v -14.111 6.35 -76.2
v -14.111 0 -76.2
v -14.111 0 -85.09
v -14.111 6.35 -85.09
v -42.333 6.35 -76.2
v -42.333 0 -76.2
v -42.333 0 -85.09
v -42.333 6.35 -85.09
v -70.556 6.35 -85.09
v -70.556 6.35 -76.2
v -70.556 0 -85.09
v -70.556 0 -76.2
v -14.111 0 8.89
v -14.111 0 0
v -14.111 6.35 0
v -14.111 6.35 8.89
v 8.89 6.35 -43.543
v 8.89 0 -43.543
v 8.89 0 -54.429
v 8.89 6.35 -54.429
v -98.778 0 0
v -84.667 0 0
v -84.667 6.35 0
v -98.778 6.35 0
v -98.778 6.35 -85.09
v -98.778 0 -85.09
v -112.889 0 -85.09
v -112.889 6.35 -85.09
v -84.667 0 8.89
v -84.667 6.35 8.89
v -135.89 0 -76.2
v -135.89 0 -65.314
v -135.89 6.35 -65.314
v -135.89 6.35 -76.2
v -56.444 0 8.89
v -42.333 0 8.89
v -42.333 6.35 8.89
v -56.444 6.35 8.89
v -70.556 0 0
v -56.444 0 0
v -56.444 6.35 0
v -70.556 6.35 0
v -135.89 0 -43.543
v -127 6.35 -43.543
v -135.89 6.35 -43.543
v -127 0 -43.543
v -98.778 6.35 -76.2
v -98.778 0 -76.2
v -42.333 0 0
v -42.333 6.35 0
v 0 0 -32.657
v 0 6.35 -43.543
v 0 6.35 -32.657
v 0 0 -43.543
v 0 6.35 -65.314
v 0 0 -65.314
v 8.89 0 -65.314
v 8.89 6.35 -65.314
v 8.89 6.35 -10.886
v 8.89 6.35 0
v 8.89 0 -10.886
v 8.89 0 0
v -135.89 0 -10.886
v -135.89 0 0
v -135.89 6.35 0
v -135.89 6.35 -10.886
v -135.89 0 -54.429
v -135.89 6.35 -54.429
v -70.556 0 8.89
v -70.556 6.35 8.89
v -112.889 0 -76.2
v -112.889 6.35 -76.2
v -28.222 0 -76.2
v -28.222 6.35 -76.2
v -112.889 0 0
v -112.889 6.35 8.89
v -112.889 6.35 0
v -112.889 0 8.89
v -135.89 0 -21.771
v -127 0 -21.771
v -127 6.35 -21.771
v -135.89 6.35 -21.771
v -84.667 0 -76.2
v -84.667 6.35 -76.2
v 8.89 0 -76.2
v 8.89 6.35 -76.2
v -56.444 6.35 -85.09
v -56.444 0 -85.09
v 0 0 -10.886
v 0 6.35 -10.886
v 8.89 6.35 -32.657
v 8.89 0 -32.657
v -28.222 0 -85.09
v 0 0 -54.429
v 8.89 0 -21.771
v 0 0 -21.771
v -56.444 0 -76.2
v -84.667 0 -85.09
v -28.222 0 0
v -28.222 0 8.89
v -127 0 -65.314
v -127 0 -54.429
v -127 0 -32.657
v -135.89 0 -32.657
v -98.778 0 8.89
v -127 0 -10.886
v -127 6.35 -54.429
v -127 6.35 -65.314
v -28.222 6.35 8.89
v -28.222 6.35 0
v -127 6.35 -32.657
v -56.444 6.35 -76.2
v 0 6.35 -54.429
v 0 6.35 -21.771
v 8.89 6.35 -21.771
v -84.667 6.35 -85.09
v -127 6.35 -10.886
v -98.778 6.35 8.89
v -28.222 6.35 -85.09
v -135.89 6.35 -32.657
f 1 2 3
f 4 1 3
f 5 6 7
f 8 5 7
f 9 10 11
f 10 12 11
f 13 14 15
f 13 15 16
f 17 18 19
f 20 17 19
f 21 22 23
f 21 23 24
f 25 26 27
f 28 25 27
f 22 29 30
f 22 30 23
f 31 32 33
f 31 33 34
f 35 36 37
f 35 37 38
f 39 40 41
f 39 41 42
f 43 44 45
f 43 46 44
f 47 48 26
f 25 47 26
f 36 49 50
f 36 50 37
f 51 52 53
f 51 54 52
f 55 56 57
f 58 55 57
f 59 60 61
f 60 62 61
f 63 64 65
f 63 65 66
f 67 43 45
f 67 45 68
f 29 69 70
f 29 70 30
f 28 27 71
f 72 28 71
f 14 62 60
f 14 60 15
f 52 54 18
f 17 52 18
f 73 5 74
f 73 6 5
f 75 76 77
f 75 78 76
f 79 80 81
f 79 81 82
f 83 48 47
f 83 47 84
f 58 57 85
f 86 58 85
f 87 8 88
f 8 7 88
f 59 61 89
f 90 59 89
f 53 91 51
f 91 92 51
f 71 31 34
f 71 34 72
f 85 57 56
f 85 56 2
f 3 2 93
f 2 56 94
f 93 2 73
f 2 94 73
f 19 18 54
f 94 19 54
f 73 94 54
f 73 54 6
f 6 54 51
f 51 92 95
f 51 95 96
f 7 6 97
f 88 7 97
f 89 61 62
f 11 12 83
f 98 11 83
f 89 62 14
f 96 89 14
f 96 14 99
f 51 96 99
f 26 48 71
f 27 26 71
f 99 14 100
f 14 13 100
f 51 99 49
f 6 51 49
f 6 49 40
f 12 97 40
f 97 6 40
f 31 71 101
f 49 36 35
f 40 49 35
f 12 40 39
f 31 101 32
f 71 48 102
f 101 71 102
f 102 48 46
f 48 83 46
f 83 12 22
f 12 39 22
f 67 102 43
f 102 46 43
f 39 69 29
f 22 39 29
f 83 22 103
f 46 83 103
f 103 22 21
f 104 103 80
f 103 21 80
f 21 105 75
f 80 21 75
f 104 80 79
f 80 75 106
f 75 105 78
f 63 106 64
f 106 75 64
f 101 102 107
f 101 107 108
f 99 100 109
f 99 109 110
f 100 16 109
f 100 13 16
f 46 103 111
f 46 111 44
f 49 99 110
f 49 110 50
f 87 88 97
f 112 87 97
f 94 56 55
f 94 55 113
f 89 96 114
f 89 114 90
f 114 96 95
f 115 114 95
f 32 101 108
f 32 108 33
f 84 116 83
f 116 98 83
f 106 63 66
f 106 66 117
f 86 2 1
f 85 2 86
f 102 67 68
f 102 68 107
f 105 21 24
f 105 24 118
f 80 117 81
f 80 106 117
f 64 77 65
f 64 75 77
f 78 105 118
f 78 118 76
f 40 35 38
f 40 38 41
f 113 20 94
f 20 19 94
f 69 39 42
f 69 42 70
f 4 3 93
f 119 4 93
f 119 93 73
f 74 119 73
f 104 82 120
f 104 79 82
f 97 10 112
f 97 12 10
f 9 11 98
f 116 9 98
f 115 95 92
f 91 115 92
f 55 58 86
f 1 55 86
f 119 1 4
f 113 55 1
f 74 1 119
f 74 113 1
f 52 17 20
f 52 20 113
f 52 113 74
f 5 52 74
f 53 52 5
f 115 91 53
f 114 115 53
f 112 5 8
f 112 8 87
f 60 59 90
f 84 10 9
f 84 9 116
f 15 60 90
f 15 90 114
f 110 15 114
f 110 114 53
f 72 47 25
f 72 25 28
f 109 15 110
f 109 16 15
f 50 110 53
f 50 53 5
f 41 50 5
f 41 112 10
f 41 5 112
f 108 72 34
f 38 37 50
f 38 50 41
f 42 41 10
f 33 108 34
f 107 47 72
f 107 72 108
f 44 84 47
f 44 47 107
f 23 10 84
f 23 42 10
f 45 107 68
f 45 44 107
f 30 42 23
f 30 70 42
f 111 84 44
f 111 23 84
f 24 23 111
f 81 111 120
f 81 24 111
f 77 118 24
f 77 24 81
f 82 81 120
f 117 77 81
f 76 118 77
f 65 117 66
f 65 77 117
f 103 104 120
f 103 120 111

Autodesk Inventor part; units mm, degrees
ref_plane "YZ Plane" through (0, 0, 0) normal (1, 0, 0) x (0, 1, 0)
ref_plane "XZ Plane" through (0, 0, 0) normal (0, 1, 0) x (-1, 0, 0)
ref_plane "XY Plane" through (0, 0, 0) normal (0, 0, 1) x (1, 0, 0)
sketch "Sketch1" plane through (0, 0, 0) normal (0, 1, 0) x (-1, 0, 0)
  line L0 (0, 0) -> (127, 0)
  line L1 (127, 0) -> (127, -76.2)
  line L2 (127, -76.2) -> (0, -76.2)
  line L3 (0, -76.2) -> (0, 0)
  dimension "BoxHeight" = 127
  dimension "d1" = 76.2
sketch "Sketch2" plane through (0, 0, 0) normal (0, 1, 0) x (-1, 0, 0)
  line L0 (0, 0) -> (-8.89, 0)
  line L1 (-8.89, 0) -> (-8.89, -10.8857)
  line L2 (-8.89, -10.8857) -> (0, -10.8857)
  line L3 (0, -10.8857) -> (0, 0)
  line L4 (0, -76.2) -> (0, 0) projected
  line L5 (0, 0) -> (127, 0) projected
  line L6 (0, -21.7714) -> (-8.89, -21.7714)
  line L7 (-8.89, -21.7714) -> (-8.89, -32.6571)
  line L8 (-8.89, -32.6571) -> (0, -32.6571)
  line L9 (0, -32.6571) -> (0, -21.7714)
  line L10 (0, -43.5429) -> (-8.89, -43.5429)
  line L11 (-8.89, -43.5429) -> (-8.89, -54.4286)
  line L12 (-8.89, -54.4286) -> (0, -54.4286)
  line L13 (0, -54.4286) -> (0, -43.5429)
  line L14 (63.5, 0) -> (63.5, -115.824) construction
  line L15 (127, -10.8857) -> (127, 0)
  line L16 (127, -76.2) -> (127, 0)
  line L17 (127, -32.6571) -> (127, -21.7714)
  line L18 (127, -54.4286) -> (127, -43.5429)
  line L19 (28.2222, -76.2) -> (14.1111, -76.2)
  line L20 (14.1111, -76.2) -> (14.1111, -85.09)
  line L21 (14.1111, -85.09) -> (28.2222, -85.09)
  line L22 (28.2222, -85.09) -> (28.2222, -76.2)
  line L23 (127, -76.2) -> (0, -76.2) projected
  line L24 (56.4444, -76.2) -> (42.3333, -76.2)
  line L25 (42.3333, -76.2) -> (42.3333, -85.09)
  line L26 (42.3333, -85.09) -> (56.4444, -85.09)
  line L27 (56.4444, -85.09) -> (56.4444, -76.2)
  line L28 (84.6667, -76.2) -> (70.5556, -76.2)
  line L29 (70.5556, -76.2) -> (70.5556, -85.09)
  line L30 (70.5556, -85.09) -> (84.6667, -85.09)
  line L31 (84.6667, -85.09) -> (84.6667, -76.2)
  line L32 (112.8889, -76.2) -> (98.7778, -76.2)
  line L33 (98.7778, -76.2) -> (98.7778, -85.09)
  line L34 (98.7778, -85.09) -> (112.8889, -85.09)
  line L35 (112.8889, -85.09) -> (112.8889, -76.2)
  line L36 (127, -38.1) -> (0, -38.1) construction
  line L37 (63.5, -76.2) -> (63.5, 39.624) construction
  line L38 (28.2222, 0) -> (14.1111, 0)
  line L39 (14.1111, 0) -> (14.1111, 8.89)
  line L40 (14.1111, 8.89) -> (28.2222, 8.89)
  line L41 (28.2222, 8.89) -> (28.2222, 0)
  line L42 (127, 0) -> (0, 0)
  line L43 (56.4444, 0) -> (42.3333, 0)
  line L44 (42.3333, 0) -> (42.3333, 8.89)
  line L45 (42.3333, 8.89) -> (56.4444, 8.89)
  line L46 (56.4444, 8.89) -> (56.4444, 0)
  line L47 (84.6667, 0) -> (70.5556, 0)
  line L48 (70.5556, 0) -> (70.5556, 8.89)
  line L49 (84.6667, 8.89) -> (84.6667, 0)
  line L50 (70.5556, 8.89) -> (84.6667, 8.89)
  line L51 (112.8889, 0) -> (98.7778, 0)
  line L52 (98.7778, 0) -> (98.7778, 8.89)
  line L53 (112.8889, 8.89) -> (112.8889, 0)
  line L54 (98.7778, 8.89) -> (112.8889, 8.89)
  line L55 (0, -65.3143) -> (-8.89, -65.3143)
  line L56 (-8.89, -65.3143) -> (-8.89, -76.2)
  line L57 (-8.89, -76.2) -> (0, -76.2)
  line L58 (0, -76.2) -> (0, -65.3143)
  line L59 (127, 0) -> (135.89, 0)
  line L60 (135.89, 0) -> (135.89, -10.8857)
  line L61 (135.89, -10.8857) -> (127, -10.8857)
  line L62 (127, -10.8857) -> (127, 0)
  line L63 (127, -76.2) -> (127, 0)
  line L64 (127, -21.7714) -> (135.89, -21.7714)
  line L65 (135.89, -21.7714) -> (135.89, -32.6571)
  line L66 (135.89, -32.6571) -> (127, -32.6571)
  line L67 (127, -32.6571) -> (127, -21.7714)
  line L68 (127, -43.5429) -> (135.89, -43.5429)
  line L69 (135.89, -43.5429) -> (135.89, -54.4286)
  line L70 (135.89, -54.4286) -> (127, -54.4286)
  line L71 (127, -54.4286) -> (127, -43.5429)
  line L72 (135.89, -65.3143) -> (135.89, -76.2)
  line L73 (127, -65.3143) -> (135.89, -65.3143)
  line L74 (135.89, -76.2) -> (127, -76.2)
  line L75 (127, -76.2) -> (127, -65.3143)
  dimension "d2" = 8.89
  dimension "d3" = 10.8857
  dimension "d5" = 8.89
  dimension "d6" = 10.8857
  dimension "d7" = 10.8857
  dimension "d8" = 8.89
  dimension "d9" = 10.8857
  dimension "d10" = 10.8857
  dimension "d11" = 14.1111
  dimension "d12" = 127
  dimension "d13" = 14.1111
  dimension "d14" = 8.89
  dimension "d15" = 8.89
  dimension "d16" = 14.1111
  dimension "d17" = 8.89
  dimension "d18" = 14.1111
  dimension "d22" = 8.89
  dimension "d23" = 14.1111
  dimension "d27" = 14.1111
  dimension "d28" = 14.1111
  dimension "d29" = 14.1111
  dimension "d34" = 76.2
  dimension "d35" = 8.89
  dimension "d36" = 10.8857
  dimension "d41" = 10.8857
extrude "Connections" add sketch "Sketch2" along normal blind 6.35 contours L3 L2 L1 L0 | L39 L40 L41 L5 | L4 L8 L7 L6 | L44 L45 L46 L5 | L4 L12 L11 L10 | L48 L50 L49 L5 | L4 L57 L56 L55 | L52 L54 L53 L5 | L19 L22 L21 L20 | L59 L60 L61 L15 | L23 L27 L26 L25 | L64 L65 L66 L16 | L23 L31 L30 L29 | L68 L69 L70 L16 | L23 L35 L34 L33 | L73 L72 L74 L16
extrude "Base Extrusion" add sketch "Sketch1" along normal blind 6.35
sketch "Sketch3" plane through (0, 6.35, 0) normal (0, 1, 0) x (1, 0, 0)
  line L0 (-6.6713, 46.5048) -> (-6.6713, 27.1528) construction
  line L1 (-6.6713, 27.1528) -> (-46.955, 27.1528) construction
  line L2 (-46.955, 27.1528) -> (-46.955, 46.5048) construction
  line L3 (-46.955, 46.5048) -> (-6.6713, 46.5048) construction
  point P0 (0, 0)
sketch "Sketch4" plane through (0, 0, 0) normal (0, -1, 0) x (1, 0, 0)
  line L0 (-84.6667, 8.89) -> (-70.5556, 8.89) projected
  line L1 (-84.6667, 0) -> (-84.6667, 8.89) projected
  line L2 (-84.6667, 0) -> (-98.7778, 0) projected
  line L3 (-98.7778, 0) -> (-98.7778, 8.89) projected
  line L4 (-98.7778, 8.89) -> (-112.8889, 8.89) projected
  line L5 (-112.8889, 8.89) -> (-112.8889, 0) projected
  line L6 (-135.89, 0) -> (-112.8889, 0) projected
  line L7 (-135.89, -10.8857) -> (-135.89, 0) projected
  line L8 (-127, -10.8857) -> (-135.89, -10.8857) projected
  line L9 (-127, -10.8857) -> (-127, -21.7714) projected
  line L10 (-135.89, -21.7714) -> (-127, -21.7714) projected
  line L11 (-135.89, -32.6571) -> (-135.89, -21.7714) projected
  line L12 (-127, -32.6571) -> (-135.89, -32.6571) projected
  line L13 (-127, -32.6571) -> (-127, -43.5429) projected
  line L14 (-135.89, -43.5429) -> (-127, -43.5429) projected
  line L15 (-135.89, -54.4286) -> (-135.89, -43.5429) projected
  line L16 (-127, -54.4286) -> (-135.89, -54.4286) projected
  line L17 (-127, -54.4286) -> (-127, -65.3143) projected
  line L18 (-127, -65.3143) -> (-135.89, -65.3143) projected
  line L19 (-135.89, -65.3143) -> (-135.89, -76.2) projected
  line L20 (-135.89, -76.2) -> (-112.8889, -76.2) projected
  line L21 (-112.8889, -76.2) -> (-112.8889, -85.09) projected
  line L22 (-112.8889, -85.09) -> (-98.7778, -85.09) projected
  line L23 (-98.7778, -85.09) -> (-98.7778, -76.2) projected
  line L24 (-98.7778, -76.2) -> (-84.6667, -76.2) projected
  line L25 (-84.6667, -76.2) -> (-84.6667, -85.09) projected
  line L26 (-84.6667, -85.09) -> (-70.5556, -85.09) projected
  line L27 (-70.5556, -85.09) -> (-70.5556, -76.2) projected
  line L28 (-70.5556, -76.2) -> (-56.4444, -76.2) projected
  line L29 (-56.4444, -85.09) -> (-56.4444, -76.2) projected
  line L30 (-42.3333, -85.09) -> (-56.4444, -85.09) projected
  line L31 (-42.3333, -76.2) -> (-42.3333, -85.09) projected
  line L32 (-42.3333, -76.2) -> (-28.2222, -76.2) projected
  line L33 (-28.2222, -85.09) -> (-28.2222, -76.2) projected
  line L34 (-14.1111, -85.09) -> (-28.2222, -85.09) projected
  line L35 (-14.1111, -76.2) -> (-14.1111, -85.09) projected
  line L36 (-14.1111, -76.2) -> (8.89, -76.2) projected
  line L37 (8.89, -76.2) -> (8.89, -65.3143) projected
  line L38 (8.89, -65.3143) -> (0, -65.3143) projected
  line L39 (0, -65.3143) -> (0, -54.4286) projected
  line L40 (8.89, -54.4286) -> (0, -54.4286) projected
  line L41 (8.89, -43.5429) -> (8.89, -54.4286) projected
  line L42 (0, -43.5429) -> (8.89, -43.5429) projected
  line L43 (0, -43.5429) -> (0, -32.6571) projected
  line L44 (8.89, -32.6571) -> (0, -32.6571) projected
  line L45 (8.89, -21.7714) -> (8.89, -32.6571) projected
  line L46 (0, -21.7714) -> (8.89, -21.7714) projected
  line L47 (0, -21.7714) -> (0, -10.8857) projected
  line L48 (8.89, -10.8857) -> (0, -10.8857) projected
  line L49 (8.89, 0) -> (8.89, -10.8857) projected
  line L50 (-14.1111, 0) -> (8.89, 0) projected
  line L51 (-14.1111, 0) -> (-14.1111, 8.89) projected
  line L52 (-14.1111, 8.89) -> (-28.2222, 8.89) projected
  line L53 (-28.2222, 8.89) -> (-28.2222, 0) projected
  line L54 (-28.2222, 0) -> (-42.3333, 0) projected
  line L55 (-42.3333, 8.89) -> (-42.3333, 0) projected
  line L56 (-56.4444, 8.89) -> (-42.3333, 8.89) projected
  line L57 (-56.4444, 0) -> (-56.4444, 8.89) projected
  line L58 (-56.4444, 0) -> (-70.5556, 0) projected
  line L59 (-70.5556, 8.89) -> (-70.5556, 0) projected
  point P0 (0, 0)
equation "\"d1\" = BaseLength"
equation "\"d2\" = PerpA"
equation "\"d3\" = PerpB"
equation "\"d5\" = d2"
equation "\"d6\" = d3"
equation "\"d7\" = PerpSpace"
equation "\"d8\" = d2"
equation "\"d9\" = d3"
equation "\"d10\" = d7"
equation "\"d11\" = -0.8 * d13 + 0.2 * d12"
equation "\"d13\" = 0.111111 * d12"
equation "\"d14\" = WallConA"
equation "\"d15\" = d14"
equation "\"d16\" = d13"
equation "\"d17\" = d15"
equation "\"d18\" = d20"
equation "\"d22\" = d14"
equation "\"d23\" = d25"
equation "\"d27\" = d11"
equation "\"d28\" = d27"
equation "\"d29\" = d11"
equation "\"d35\" = d37"
equation "\"d36\" = d38"
equation "\"d41\" = d10"
equation "\"d20\" = 0.111111 * d21"
equation "\"d25\" = 0.111111 * d26"
equation "\"d37\" = d39"
equation "\"d38\" = d40"
equation "\"BaseLength\" = 76.2"
equation "\"PerpA\" = 8.89"
equation "\"PerpB\" = 10.885714"
equation "\"PerpSpace\" = 10.885714"
equation "\"WallConA\" = 8.89"
equation "\"d21\" = 127"
equation "\"d26\" = 127"
equation "\"d39\" = 8.89"
equation "\"d40\" = 10.885714"
properties part number "WallToWall(Perpendicular1)"
